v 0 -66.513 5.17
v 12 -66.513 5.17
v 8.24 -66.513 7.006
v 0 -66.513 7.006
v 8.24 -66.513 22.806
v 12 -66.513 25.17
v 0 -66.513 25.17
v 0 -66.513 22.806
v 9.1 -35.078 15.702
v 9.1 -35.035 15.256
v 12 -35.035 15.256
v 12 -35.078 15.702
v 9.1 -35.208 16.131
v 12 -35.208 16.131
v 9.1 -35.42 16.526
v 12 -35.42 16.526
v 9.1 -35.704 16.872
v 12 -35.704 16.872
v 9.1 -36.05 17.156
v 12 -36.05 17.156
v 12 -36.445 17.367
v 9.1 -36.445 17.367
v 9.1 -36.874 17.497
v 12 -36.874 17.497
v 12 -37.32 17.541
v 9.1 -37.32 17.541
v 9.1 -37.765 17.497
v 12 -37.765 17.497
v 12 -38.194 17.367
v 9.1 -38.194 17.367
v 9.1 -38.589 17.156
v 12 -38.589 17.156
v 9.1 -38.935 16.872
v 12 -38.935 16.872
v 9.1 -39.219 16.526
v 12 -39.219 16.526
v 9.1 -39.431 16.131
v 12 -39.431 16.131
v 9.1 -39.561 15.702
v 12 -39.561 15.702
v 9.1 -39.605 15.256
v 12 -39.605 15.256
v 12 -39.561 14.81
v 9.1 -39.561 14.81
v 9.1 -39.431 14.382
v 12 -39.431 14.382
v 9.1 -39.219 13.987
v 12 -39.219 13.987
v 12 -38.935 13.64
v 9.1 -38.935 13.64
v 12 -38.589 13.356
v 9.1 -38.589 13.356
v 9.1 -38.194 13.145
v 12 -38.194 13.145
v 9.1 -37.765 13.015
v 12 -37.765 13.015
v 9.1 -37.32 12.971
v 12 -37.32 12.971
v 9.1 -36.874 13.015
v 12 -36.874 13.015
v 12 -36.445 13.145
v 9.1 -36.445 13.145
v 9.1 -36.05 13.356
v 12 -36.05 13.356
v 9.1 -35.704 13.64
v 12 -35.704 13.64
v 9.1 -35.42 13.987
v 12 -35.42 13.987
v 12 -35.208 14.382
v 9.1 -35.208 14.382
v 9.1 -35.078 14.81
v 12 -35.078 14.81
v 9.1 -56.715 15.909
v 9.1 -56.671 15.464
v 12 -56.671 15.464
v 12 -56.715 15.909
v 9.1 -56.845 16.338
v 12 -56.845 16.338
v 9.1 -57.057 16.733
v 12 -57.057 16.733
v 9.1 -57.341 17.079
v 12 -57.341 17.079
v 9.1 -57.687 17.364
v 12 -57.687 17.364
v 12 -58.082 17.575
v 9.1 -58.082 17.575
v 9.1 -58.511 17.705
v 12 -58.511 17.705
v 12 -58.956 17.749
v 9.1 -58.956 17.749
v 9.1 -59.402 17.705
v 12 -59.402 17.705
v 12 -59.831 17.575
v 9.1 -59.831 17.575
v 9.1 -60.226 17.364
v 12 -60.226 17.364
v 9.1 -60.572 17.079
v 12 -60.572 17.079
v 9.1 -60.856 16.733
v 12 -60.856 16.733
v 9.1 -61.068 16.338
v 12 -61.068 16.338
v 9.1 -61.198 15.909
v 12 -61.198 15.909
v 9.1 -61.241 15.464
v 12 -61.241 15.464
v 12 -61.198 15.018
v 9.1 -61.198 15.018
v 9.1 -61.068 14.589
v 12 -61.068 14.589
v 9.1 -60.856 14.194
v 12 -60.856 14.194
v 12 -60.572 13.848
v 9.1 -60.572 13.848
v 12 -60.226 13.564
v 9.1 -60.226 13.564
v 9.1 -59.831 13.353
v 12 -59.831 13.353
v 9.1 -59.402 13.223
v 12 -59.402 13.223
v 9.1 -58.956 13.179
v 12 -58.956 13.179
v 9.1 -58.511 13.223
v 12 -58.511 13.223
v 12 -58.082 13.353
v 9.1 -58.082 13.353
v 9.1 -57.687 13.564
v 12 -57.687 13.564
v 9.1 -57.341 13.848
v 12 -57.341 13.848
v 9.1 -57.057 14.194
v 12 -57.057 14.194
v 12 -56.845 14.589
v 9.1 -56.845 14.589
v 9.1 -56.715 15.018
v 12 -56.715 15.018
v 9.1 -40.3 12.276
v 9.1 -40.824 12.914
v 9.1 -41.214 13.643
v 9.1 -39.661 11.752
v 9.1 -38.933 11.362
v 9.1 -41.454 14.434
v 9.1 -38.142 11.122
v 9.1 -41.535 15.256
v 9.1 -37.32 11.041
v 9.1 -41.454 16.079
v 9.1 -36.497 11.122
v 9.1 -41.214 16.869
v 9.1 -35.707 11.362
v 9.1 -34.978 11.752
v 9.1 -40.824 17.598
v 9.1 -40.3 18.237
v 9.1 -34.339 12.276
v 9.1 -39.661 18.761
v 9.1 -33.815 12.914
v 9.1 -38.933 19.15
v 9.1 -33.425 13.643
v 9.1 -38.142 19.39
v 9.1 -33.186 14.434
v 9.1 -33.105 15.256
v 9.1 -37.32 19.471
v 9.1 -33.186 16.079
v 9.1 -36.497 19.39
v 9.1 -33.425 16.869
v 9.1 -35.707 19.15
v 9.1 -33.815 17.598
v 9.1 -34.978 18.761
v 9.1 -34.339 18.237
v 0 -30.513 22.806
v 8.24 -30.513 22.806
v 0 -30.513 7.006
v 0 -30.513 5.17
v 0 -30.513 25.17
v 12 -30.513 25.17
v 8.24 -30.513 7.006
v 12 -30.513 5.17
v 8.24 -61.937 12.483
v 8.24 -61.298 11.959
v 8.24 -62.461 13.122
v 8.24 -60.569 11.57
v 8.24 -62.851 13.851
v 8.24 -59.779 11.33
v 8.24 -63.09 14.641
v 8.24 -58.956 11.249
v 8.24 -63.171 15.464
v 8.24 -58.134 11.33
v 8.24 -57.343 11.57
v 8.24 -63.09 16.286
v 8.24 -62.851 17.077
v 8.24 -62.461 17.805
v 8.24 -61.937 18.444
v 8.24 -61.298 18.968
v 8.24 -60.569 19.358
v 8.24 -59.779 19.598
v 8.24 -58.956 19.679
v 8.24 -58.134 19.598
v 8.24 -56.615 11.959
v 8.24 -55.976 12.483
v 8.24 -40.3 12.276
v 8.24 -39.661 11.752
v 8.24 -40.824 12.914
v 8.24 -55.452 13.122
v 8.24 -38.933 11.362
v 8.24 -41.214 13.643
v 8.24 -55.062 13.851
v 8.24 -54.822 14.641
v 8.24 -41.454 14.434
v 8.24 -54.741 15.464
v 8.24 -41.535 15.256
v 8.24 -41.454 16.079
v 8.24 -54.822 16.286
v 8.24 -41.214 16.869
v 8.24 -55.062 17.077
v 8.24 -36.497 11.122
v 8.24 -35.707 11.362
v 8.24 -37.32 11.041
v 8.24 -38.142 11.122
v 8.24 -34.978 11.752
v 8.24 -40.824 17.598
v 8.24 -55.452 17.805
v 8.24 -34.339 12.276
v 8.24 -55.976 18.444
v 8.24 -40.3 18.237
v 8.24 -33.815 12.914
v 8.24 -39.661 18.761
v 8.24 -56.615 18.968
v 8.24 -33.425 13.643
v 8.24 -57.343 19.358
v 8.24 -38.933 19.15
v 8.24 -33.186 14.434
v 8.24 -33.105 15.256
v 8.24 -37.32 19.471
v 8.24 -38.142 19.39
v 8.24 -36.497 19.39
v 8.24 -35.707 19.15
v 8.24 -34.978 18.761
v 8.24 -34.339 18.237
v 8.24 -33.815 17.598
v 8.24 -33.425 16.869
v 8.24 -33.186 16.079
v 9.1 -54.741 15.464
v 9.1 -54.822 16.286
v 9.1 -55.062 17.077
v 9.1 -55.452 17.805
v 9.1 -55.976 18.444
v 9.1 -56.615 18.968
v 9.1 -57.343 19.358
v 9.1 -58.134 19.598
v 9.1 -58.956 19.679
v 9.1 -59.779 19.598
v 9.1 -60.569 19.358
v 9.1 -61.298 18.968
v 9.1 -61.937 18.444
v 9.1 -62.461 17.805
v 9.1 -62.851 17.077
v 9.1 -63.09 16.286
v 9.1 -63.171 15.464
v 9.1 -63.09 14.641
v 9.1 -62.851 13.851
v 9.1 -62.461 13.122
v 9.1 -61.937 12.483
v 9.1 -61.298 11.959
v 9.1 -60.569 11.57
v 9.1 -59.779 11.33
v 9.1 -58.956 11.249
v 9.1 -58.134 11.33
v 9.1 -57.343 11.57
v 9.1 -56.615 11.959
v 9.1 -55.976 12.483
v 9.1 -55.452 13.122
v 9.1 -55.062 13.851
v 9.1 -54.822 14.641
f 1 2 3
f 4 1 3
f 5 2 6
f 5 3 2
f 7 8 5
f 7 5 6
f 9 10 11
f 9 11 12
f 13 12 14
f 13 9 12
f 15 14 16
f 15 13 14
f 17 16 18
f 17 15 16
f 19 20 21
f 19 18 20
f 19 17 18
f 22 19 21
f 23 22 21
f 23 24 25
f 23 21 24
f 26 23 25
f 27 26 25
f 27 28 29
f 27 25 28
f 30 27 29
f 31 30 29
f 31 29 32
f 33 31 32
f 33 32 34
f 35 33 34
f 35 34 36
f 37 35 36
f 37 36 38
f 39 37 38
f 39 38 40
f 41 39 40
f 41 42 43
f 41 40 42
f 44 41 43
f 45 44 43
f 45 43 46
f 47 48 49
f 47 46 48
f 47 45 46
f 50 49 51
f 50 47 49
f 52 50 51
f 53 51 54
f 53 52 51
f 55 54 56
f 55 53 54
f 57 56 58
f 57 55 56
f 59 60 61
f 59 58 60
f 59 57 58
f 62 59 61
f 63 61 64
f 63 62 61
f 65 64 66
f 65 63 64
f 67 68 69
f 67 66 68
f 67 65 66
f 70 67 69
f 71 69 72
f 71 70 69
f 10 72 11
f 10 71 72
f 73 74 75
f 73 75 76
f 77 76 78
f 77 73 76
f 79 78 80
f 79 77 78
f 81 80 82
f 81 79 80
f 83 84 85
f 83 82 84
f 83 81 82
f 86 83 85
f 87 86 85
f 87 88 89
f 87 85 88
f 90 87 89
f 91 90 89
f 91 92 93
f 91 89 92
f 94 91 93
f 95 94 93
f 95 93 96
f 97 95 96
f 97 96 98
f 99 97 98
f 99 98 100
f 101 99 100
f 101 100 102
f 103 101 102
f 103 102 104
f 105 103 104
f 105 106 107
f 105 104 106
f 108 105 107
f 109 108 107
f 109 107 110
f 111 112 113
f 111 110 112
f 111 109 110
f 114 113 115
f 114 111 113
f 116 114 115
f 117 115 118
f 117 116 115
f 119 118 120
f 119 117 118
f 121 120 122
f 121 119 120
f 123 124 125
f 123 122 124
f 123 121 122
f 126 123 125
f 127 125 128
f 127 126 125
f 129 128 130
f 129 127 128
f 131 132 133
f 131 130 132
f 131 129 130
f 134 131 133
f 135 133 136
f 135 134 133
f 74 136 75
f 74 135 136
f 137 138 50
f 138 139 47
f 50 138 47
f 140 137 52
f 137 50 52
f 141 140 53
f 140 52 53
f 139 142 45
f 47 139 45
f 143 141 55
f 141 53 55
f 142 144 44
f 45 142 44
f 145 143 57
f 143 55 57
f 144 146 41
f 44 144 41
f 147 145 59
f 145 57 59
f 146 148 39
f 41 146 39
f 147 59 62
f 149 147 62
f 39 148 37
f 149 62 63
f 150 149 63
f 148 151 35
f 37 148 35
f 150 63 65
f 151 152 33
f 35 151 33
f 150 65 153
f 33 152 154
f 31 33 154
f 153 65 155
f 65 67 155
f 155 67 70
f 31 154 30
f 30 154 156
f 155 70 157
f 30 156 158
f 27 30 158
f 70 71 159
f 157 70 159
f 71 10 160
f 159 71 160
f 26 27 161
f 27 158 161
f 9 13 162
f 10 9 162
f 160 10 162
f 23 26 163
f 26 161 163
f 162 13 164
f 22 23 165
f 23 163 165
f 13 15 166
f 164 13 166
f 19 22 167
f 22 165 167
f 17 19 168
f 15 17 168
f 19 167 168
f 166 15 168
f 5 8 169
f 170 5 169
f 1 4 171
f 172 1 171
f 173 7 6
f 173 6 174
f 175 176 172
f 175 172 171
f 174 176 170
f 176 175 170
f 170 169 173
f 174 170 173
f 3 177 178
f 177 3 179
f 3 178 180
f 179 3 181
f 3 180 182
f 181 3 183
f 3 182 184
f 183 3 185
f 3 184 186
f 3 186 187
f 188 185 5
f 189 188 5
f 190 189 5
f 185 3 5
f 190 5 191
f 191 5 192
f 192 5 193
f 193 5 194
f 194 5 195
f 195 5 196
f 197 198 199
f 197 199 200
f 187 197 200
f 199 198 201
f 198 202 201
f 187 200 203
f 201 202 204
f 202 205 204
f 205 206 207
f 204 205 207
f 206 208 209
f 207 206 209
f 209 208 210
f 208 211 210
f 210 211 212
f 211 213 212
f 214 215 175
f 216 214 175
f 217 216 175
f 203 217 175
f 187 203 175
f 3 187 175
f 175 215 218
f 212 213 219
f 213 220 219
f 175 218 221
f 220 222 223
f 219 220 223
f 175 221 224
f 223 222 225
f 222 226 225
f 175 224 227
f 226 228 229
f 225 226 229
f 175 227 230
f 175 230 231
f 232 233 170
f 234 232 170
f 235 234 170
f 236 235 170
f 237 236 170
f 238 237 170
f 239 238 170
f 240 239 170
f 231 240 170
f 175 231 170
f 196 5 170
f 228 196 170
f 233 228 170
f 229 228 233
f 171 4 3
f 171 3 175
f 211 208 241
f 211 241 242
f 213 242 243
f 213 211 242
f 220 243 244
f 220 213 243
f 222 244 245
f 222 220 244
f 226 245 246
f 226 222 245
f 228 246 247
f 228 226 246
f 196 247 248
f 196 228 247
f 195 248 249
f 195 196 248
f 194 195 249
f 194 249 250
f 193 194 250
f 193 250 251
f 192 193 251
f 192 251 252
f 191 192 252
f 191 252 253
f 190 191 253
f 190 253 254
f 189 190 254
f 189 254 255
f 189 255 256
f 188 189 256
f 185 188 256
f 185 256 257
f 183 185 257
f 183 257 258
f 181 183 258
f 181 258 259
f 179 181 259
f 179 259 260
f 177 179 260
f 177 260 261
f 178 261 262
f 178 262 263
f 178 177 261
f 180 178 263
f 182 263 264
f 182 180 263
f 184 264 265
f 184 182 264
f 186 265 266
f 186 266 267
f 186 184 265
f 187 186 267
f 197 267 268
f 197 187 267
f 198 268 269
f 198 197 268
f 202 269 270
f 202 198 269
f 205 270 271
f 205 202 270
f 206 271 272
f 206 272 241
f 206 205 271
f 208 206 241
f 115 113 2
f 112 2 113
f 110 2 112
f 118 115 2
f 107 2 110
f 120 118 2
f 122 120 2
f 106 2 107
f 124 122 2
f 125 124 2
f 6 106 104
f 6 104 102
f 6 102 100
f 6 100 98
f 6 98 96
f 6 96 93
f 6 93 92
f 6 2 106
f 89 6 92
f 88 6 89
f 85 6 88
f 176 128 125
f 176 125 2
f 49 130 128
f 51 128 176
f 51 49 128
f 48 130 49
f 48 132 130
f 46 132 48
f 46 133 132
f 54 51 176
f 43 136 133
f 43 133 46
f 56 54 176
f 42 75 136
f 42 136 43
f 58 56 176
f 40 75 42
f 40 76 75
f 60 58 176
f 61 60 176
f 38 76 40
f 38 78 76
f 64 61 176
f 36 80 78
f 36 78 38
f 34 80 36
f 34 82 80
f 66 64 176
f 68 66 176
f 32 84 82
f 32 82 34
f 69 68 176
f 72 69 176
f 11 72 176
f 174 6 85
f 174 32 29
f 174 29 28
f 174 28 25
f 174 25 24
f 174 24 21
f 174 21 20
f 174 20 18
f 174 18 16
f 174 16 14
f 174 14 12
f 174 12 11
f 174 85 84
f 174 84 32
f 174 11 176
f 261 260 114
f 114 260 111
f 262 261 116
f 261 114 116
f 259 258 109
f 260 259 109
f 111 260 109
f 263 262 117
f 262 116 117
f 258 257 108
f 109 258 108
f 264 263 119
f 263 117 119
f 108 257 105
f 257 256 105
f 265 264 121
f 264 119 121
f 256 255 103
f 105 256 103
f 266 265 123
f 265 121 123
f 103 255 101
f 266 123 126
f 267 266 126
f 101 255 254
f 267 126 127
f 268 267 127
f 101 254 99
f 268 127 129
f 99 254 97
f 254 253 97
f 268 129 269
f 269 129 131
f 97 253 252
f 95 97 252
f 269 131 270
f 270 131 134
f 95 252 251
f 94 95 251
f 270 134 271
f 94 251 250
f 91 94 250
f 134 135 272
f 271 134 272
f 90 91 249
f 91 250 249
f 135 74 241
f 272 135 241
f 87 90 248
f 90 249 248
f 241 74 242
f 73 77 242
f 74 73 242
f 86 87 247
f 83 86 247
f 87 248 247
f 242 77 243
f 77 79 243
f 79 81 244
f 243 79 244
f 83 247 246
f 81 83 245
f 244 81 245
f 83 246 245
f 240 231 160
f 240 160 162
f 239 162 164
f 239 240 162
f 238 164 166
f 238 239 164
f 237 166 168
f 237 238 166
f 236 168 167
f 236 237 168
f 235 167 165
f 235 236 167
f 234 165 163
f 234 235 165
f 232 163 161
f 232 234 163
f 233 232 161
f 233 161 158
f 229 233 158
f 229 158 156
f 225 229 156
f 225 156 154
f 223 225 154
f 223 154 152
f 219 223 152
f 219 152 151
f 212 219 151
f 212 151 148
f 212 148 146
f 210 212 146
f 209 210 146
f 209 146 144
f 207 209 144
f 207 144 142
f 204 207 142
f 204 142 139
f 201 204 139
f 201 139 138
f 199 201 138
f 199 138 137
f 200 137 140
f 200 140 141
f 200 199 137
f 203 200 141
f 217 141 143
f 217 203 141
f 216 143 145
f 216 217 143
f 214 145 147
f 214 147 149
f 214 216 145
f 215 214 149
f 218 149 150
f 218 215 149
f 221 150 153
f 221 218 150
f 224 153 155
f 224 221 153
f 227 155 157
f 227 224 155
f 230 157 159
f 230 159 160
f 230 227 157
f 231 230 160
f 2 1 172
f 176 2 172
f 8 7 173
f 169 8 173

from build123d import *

# Parameters (mm, degrees)
F0_W     = 36
F0_H     = 20
F1_DEPTH = 12
F2_W     = 43.75383
F2_H     = 15.8
F3_DEPTH = 8.24
F4_R     = 2.285
F5_DEPTH = 34.9
F6_R     = 4.215
F7_DEPTH = 9.1


with BuildPart() as f1:
    # F0 (on Right) → F1 (new body)
    with BuildSketch(Plane.YZ):
        with Locations((-48.512831, 15.170117)):
            Rectangle(F0_W, F0_H)
    extrude(amount=F1_DEPTH)

    # F2 (on Right) → F3 (cut)
    with BuildSketch(Plane.YZ):
        with Locations((-48.435772, 14.905577)):
            Rectangle(F2_W, F2_H)
    extrude(amount=F3_DEPTH, mode=Mode.SUBTRACT)

    # F4 (on Right) → F5 (cut)
    with BuildSketch(Plane.YZ):
        with Locations((-37.319533, 15.256222)):
            Circle(F4_R)
        with Locations((-58.956481, 15.463678)):
            Circle(F4_R)
    extrude(amount=F5_DEPTH, mode=Mode.SUBTRACT)

    # F6 (on Right) → F7 (cut)
    with BuildSketch(Plane.YZ):
        with Locations((-37.319533, 15.256222)):
            Circle(F6_R)
        with Locations((-58.956481, 15.463678)):
            Circle(F6_R)
    extrude(amount=F7_DEPTH, mode=Mode.SUBTRACT)


solid = f1.part
